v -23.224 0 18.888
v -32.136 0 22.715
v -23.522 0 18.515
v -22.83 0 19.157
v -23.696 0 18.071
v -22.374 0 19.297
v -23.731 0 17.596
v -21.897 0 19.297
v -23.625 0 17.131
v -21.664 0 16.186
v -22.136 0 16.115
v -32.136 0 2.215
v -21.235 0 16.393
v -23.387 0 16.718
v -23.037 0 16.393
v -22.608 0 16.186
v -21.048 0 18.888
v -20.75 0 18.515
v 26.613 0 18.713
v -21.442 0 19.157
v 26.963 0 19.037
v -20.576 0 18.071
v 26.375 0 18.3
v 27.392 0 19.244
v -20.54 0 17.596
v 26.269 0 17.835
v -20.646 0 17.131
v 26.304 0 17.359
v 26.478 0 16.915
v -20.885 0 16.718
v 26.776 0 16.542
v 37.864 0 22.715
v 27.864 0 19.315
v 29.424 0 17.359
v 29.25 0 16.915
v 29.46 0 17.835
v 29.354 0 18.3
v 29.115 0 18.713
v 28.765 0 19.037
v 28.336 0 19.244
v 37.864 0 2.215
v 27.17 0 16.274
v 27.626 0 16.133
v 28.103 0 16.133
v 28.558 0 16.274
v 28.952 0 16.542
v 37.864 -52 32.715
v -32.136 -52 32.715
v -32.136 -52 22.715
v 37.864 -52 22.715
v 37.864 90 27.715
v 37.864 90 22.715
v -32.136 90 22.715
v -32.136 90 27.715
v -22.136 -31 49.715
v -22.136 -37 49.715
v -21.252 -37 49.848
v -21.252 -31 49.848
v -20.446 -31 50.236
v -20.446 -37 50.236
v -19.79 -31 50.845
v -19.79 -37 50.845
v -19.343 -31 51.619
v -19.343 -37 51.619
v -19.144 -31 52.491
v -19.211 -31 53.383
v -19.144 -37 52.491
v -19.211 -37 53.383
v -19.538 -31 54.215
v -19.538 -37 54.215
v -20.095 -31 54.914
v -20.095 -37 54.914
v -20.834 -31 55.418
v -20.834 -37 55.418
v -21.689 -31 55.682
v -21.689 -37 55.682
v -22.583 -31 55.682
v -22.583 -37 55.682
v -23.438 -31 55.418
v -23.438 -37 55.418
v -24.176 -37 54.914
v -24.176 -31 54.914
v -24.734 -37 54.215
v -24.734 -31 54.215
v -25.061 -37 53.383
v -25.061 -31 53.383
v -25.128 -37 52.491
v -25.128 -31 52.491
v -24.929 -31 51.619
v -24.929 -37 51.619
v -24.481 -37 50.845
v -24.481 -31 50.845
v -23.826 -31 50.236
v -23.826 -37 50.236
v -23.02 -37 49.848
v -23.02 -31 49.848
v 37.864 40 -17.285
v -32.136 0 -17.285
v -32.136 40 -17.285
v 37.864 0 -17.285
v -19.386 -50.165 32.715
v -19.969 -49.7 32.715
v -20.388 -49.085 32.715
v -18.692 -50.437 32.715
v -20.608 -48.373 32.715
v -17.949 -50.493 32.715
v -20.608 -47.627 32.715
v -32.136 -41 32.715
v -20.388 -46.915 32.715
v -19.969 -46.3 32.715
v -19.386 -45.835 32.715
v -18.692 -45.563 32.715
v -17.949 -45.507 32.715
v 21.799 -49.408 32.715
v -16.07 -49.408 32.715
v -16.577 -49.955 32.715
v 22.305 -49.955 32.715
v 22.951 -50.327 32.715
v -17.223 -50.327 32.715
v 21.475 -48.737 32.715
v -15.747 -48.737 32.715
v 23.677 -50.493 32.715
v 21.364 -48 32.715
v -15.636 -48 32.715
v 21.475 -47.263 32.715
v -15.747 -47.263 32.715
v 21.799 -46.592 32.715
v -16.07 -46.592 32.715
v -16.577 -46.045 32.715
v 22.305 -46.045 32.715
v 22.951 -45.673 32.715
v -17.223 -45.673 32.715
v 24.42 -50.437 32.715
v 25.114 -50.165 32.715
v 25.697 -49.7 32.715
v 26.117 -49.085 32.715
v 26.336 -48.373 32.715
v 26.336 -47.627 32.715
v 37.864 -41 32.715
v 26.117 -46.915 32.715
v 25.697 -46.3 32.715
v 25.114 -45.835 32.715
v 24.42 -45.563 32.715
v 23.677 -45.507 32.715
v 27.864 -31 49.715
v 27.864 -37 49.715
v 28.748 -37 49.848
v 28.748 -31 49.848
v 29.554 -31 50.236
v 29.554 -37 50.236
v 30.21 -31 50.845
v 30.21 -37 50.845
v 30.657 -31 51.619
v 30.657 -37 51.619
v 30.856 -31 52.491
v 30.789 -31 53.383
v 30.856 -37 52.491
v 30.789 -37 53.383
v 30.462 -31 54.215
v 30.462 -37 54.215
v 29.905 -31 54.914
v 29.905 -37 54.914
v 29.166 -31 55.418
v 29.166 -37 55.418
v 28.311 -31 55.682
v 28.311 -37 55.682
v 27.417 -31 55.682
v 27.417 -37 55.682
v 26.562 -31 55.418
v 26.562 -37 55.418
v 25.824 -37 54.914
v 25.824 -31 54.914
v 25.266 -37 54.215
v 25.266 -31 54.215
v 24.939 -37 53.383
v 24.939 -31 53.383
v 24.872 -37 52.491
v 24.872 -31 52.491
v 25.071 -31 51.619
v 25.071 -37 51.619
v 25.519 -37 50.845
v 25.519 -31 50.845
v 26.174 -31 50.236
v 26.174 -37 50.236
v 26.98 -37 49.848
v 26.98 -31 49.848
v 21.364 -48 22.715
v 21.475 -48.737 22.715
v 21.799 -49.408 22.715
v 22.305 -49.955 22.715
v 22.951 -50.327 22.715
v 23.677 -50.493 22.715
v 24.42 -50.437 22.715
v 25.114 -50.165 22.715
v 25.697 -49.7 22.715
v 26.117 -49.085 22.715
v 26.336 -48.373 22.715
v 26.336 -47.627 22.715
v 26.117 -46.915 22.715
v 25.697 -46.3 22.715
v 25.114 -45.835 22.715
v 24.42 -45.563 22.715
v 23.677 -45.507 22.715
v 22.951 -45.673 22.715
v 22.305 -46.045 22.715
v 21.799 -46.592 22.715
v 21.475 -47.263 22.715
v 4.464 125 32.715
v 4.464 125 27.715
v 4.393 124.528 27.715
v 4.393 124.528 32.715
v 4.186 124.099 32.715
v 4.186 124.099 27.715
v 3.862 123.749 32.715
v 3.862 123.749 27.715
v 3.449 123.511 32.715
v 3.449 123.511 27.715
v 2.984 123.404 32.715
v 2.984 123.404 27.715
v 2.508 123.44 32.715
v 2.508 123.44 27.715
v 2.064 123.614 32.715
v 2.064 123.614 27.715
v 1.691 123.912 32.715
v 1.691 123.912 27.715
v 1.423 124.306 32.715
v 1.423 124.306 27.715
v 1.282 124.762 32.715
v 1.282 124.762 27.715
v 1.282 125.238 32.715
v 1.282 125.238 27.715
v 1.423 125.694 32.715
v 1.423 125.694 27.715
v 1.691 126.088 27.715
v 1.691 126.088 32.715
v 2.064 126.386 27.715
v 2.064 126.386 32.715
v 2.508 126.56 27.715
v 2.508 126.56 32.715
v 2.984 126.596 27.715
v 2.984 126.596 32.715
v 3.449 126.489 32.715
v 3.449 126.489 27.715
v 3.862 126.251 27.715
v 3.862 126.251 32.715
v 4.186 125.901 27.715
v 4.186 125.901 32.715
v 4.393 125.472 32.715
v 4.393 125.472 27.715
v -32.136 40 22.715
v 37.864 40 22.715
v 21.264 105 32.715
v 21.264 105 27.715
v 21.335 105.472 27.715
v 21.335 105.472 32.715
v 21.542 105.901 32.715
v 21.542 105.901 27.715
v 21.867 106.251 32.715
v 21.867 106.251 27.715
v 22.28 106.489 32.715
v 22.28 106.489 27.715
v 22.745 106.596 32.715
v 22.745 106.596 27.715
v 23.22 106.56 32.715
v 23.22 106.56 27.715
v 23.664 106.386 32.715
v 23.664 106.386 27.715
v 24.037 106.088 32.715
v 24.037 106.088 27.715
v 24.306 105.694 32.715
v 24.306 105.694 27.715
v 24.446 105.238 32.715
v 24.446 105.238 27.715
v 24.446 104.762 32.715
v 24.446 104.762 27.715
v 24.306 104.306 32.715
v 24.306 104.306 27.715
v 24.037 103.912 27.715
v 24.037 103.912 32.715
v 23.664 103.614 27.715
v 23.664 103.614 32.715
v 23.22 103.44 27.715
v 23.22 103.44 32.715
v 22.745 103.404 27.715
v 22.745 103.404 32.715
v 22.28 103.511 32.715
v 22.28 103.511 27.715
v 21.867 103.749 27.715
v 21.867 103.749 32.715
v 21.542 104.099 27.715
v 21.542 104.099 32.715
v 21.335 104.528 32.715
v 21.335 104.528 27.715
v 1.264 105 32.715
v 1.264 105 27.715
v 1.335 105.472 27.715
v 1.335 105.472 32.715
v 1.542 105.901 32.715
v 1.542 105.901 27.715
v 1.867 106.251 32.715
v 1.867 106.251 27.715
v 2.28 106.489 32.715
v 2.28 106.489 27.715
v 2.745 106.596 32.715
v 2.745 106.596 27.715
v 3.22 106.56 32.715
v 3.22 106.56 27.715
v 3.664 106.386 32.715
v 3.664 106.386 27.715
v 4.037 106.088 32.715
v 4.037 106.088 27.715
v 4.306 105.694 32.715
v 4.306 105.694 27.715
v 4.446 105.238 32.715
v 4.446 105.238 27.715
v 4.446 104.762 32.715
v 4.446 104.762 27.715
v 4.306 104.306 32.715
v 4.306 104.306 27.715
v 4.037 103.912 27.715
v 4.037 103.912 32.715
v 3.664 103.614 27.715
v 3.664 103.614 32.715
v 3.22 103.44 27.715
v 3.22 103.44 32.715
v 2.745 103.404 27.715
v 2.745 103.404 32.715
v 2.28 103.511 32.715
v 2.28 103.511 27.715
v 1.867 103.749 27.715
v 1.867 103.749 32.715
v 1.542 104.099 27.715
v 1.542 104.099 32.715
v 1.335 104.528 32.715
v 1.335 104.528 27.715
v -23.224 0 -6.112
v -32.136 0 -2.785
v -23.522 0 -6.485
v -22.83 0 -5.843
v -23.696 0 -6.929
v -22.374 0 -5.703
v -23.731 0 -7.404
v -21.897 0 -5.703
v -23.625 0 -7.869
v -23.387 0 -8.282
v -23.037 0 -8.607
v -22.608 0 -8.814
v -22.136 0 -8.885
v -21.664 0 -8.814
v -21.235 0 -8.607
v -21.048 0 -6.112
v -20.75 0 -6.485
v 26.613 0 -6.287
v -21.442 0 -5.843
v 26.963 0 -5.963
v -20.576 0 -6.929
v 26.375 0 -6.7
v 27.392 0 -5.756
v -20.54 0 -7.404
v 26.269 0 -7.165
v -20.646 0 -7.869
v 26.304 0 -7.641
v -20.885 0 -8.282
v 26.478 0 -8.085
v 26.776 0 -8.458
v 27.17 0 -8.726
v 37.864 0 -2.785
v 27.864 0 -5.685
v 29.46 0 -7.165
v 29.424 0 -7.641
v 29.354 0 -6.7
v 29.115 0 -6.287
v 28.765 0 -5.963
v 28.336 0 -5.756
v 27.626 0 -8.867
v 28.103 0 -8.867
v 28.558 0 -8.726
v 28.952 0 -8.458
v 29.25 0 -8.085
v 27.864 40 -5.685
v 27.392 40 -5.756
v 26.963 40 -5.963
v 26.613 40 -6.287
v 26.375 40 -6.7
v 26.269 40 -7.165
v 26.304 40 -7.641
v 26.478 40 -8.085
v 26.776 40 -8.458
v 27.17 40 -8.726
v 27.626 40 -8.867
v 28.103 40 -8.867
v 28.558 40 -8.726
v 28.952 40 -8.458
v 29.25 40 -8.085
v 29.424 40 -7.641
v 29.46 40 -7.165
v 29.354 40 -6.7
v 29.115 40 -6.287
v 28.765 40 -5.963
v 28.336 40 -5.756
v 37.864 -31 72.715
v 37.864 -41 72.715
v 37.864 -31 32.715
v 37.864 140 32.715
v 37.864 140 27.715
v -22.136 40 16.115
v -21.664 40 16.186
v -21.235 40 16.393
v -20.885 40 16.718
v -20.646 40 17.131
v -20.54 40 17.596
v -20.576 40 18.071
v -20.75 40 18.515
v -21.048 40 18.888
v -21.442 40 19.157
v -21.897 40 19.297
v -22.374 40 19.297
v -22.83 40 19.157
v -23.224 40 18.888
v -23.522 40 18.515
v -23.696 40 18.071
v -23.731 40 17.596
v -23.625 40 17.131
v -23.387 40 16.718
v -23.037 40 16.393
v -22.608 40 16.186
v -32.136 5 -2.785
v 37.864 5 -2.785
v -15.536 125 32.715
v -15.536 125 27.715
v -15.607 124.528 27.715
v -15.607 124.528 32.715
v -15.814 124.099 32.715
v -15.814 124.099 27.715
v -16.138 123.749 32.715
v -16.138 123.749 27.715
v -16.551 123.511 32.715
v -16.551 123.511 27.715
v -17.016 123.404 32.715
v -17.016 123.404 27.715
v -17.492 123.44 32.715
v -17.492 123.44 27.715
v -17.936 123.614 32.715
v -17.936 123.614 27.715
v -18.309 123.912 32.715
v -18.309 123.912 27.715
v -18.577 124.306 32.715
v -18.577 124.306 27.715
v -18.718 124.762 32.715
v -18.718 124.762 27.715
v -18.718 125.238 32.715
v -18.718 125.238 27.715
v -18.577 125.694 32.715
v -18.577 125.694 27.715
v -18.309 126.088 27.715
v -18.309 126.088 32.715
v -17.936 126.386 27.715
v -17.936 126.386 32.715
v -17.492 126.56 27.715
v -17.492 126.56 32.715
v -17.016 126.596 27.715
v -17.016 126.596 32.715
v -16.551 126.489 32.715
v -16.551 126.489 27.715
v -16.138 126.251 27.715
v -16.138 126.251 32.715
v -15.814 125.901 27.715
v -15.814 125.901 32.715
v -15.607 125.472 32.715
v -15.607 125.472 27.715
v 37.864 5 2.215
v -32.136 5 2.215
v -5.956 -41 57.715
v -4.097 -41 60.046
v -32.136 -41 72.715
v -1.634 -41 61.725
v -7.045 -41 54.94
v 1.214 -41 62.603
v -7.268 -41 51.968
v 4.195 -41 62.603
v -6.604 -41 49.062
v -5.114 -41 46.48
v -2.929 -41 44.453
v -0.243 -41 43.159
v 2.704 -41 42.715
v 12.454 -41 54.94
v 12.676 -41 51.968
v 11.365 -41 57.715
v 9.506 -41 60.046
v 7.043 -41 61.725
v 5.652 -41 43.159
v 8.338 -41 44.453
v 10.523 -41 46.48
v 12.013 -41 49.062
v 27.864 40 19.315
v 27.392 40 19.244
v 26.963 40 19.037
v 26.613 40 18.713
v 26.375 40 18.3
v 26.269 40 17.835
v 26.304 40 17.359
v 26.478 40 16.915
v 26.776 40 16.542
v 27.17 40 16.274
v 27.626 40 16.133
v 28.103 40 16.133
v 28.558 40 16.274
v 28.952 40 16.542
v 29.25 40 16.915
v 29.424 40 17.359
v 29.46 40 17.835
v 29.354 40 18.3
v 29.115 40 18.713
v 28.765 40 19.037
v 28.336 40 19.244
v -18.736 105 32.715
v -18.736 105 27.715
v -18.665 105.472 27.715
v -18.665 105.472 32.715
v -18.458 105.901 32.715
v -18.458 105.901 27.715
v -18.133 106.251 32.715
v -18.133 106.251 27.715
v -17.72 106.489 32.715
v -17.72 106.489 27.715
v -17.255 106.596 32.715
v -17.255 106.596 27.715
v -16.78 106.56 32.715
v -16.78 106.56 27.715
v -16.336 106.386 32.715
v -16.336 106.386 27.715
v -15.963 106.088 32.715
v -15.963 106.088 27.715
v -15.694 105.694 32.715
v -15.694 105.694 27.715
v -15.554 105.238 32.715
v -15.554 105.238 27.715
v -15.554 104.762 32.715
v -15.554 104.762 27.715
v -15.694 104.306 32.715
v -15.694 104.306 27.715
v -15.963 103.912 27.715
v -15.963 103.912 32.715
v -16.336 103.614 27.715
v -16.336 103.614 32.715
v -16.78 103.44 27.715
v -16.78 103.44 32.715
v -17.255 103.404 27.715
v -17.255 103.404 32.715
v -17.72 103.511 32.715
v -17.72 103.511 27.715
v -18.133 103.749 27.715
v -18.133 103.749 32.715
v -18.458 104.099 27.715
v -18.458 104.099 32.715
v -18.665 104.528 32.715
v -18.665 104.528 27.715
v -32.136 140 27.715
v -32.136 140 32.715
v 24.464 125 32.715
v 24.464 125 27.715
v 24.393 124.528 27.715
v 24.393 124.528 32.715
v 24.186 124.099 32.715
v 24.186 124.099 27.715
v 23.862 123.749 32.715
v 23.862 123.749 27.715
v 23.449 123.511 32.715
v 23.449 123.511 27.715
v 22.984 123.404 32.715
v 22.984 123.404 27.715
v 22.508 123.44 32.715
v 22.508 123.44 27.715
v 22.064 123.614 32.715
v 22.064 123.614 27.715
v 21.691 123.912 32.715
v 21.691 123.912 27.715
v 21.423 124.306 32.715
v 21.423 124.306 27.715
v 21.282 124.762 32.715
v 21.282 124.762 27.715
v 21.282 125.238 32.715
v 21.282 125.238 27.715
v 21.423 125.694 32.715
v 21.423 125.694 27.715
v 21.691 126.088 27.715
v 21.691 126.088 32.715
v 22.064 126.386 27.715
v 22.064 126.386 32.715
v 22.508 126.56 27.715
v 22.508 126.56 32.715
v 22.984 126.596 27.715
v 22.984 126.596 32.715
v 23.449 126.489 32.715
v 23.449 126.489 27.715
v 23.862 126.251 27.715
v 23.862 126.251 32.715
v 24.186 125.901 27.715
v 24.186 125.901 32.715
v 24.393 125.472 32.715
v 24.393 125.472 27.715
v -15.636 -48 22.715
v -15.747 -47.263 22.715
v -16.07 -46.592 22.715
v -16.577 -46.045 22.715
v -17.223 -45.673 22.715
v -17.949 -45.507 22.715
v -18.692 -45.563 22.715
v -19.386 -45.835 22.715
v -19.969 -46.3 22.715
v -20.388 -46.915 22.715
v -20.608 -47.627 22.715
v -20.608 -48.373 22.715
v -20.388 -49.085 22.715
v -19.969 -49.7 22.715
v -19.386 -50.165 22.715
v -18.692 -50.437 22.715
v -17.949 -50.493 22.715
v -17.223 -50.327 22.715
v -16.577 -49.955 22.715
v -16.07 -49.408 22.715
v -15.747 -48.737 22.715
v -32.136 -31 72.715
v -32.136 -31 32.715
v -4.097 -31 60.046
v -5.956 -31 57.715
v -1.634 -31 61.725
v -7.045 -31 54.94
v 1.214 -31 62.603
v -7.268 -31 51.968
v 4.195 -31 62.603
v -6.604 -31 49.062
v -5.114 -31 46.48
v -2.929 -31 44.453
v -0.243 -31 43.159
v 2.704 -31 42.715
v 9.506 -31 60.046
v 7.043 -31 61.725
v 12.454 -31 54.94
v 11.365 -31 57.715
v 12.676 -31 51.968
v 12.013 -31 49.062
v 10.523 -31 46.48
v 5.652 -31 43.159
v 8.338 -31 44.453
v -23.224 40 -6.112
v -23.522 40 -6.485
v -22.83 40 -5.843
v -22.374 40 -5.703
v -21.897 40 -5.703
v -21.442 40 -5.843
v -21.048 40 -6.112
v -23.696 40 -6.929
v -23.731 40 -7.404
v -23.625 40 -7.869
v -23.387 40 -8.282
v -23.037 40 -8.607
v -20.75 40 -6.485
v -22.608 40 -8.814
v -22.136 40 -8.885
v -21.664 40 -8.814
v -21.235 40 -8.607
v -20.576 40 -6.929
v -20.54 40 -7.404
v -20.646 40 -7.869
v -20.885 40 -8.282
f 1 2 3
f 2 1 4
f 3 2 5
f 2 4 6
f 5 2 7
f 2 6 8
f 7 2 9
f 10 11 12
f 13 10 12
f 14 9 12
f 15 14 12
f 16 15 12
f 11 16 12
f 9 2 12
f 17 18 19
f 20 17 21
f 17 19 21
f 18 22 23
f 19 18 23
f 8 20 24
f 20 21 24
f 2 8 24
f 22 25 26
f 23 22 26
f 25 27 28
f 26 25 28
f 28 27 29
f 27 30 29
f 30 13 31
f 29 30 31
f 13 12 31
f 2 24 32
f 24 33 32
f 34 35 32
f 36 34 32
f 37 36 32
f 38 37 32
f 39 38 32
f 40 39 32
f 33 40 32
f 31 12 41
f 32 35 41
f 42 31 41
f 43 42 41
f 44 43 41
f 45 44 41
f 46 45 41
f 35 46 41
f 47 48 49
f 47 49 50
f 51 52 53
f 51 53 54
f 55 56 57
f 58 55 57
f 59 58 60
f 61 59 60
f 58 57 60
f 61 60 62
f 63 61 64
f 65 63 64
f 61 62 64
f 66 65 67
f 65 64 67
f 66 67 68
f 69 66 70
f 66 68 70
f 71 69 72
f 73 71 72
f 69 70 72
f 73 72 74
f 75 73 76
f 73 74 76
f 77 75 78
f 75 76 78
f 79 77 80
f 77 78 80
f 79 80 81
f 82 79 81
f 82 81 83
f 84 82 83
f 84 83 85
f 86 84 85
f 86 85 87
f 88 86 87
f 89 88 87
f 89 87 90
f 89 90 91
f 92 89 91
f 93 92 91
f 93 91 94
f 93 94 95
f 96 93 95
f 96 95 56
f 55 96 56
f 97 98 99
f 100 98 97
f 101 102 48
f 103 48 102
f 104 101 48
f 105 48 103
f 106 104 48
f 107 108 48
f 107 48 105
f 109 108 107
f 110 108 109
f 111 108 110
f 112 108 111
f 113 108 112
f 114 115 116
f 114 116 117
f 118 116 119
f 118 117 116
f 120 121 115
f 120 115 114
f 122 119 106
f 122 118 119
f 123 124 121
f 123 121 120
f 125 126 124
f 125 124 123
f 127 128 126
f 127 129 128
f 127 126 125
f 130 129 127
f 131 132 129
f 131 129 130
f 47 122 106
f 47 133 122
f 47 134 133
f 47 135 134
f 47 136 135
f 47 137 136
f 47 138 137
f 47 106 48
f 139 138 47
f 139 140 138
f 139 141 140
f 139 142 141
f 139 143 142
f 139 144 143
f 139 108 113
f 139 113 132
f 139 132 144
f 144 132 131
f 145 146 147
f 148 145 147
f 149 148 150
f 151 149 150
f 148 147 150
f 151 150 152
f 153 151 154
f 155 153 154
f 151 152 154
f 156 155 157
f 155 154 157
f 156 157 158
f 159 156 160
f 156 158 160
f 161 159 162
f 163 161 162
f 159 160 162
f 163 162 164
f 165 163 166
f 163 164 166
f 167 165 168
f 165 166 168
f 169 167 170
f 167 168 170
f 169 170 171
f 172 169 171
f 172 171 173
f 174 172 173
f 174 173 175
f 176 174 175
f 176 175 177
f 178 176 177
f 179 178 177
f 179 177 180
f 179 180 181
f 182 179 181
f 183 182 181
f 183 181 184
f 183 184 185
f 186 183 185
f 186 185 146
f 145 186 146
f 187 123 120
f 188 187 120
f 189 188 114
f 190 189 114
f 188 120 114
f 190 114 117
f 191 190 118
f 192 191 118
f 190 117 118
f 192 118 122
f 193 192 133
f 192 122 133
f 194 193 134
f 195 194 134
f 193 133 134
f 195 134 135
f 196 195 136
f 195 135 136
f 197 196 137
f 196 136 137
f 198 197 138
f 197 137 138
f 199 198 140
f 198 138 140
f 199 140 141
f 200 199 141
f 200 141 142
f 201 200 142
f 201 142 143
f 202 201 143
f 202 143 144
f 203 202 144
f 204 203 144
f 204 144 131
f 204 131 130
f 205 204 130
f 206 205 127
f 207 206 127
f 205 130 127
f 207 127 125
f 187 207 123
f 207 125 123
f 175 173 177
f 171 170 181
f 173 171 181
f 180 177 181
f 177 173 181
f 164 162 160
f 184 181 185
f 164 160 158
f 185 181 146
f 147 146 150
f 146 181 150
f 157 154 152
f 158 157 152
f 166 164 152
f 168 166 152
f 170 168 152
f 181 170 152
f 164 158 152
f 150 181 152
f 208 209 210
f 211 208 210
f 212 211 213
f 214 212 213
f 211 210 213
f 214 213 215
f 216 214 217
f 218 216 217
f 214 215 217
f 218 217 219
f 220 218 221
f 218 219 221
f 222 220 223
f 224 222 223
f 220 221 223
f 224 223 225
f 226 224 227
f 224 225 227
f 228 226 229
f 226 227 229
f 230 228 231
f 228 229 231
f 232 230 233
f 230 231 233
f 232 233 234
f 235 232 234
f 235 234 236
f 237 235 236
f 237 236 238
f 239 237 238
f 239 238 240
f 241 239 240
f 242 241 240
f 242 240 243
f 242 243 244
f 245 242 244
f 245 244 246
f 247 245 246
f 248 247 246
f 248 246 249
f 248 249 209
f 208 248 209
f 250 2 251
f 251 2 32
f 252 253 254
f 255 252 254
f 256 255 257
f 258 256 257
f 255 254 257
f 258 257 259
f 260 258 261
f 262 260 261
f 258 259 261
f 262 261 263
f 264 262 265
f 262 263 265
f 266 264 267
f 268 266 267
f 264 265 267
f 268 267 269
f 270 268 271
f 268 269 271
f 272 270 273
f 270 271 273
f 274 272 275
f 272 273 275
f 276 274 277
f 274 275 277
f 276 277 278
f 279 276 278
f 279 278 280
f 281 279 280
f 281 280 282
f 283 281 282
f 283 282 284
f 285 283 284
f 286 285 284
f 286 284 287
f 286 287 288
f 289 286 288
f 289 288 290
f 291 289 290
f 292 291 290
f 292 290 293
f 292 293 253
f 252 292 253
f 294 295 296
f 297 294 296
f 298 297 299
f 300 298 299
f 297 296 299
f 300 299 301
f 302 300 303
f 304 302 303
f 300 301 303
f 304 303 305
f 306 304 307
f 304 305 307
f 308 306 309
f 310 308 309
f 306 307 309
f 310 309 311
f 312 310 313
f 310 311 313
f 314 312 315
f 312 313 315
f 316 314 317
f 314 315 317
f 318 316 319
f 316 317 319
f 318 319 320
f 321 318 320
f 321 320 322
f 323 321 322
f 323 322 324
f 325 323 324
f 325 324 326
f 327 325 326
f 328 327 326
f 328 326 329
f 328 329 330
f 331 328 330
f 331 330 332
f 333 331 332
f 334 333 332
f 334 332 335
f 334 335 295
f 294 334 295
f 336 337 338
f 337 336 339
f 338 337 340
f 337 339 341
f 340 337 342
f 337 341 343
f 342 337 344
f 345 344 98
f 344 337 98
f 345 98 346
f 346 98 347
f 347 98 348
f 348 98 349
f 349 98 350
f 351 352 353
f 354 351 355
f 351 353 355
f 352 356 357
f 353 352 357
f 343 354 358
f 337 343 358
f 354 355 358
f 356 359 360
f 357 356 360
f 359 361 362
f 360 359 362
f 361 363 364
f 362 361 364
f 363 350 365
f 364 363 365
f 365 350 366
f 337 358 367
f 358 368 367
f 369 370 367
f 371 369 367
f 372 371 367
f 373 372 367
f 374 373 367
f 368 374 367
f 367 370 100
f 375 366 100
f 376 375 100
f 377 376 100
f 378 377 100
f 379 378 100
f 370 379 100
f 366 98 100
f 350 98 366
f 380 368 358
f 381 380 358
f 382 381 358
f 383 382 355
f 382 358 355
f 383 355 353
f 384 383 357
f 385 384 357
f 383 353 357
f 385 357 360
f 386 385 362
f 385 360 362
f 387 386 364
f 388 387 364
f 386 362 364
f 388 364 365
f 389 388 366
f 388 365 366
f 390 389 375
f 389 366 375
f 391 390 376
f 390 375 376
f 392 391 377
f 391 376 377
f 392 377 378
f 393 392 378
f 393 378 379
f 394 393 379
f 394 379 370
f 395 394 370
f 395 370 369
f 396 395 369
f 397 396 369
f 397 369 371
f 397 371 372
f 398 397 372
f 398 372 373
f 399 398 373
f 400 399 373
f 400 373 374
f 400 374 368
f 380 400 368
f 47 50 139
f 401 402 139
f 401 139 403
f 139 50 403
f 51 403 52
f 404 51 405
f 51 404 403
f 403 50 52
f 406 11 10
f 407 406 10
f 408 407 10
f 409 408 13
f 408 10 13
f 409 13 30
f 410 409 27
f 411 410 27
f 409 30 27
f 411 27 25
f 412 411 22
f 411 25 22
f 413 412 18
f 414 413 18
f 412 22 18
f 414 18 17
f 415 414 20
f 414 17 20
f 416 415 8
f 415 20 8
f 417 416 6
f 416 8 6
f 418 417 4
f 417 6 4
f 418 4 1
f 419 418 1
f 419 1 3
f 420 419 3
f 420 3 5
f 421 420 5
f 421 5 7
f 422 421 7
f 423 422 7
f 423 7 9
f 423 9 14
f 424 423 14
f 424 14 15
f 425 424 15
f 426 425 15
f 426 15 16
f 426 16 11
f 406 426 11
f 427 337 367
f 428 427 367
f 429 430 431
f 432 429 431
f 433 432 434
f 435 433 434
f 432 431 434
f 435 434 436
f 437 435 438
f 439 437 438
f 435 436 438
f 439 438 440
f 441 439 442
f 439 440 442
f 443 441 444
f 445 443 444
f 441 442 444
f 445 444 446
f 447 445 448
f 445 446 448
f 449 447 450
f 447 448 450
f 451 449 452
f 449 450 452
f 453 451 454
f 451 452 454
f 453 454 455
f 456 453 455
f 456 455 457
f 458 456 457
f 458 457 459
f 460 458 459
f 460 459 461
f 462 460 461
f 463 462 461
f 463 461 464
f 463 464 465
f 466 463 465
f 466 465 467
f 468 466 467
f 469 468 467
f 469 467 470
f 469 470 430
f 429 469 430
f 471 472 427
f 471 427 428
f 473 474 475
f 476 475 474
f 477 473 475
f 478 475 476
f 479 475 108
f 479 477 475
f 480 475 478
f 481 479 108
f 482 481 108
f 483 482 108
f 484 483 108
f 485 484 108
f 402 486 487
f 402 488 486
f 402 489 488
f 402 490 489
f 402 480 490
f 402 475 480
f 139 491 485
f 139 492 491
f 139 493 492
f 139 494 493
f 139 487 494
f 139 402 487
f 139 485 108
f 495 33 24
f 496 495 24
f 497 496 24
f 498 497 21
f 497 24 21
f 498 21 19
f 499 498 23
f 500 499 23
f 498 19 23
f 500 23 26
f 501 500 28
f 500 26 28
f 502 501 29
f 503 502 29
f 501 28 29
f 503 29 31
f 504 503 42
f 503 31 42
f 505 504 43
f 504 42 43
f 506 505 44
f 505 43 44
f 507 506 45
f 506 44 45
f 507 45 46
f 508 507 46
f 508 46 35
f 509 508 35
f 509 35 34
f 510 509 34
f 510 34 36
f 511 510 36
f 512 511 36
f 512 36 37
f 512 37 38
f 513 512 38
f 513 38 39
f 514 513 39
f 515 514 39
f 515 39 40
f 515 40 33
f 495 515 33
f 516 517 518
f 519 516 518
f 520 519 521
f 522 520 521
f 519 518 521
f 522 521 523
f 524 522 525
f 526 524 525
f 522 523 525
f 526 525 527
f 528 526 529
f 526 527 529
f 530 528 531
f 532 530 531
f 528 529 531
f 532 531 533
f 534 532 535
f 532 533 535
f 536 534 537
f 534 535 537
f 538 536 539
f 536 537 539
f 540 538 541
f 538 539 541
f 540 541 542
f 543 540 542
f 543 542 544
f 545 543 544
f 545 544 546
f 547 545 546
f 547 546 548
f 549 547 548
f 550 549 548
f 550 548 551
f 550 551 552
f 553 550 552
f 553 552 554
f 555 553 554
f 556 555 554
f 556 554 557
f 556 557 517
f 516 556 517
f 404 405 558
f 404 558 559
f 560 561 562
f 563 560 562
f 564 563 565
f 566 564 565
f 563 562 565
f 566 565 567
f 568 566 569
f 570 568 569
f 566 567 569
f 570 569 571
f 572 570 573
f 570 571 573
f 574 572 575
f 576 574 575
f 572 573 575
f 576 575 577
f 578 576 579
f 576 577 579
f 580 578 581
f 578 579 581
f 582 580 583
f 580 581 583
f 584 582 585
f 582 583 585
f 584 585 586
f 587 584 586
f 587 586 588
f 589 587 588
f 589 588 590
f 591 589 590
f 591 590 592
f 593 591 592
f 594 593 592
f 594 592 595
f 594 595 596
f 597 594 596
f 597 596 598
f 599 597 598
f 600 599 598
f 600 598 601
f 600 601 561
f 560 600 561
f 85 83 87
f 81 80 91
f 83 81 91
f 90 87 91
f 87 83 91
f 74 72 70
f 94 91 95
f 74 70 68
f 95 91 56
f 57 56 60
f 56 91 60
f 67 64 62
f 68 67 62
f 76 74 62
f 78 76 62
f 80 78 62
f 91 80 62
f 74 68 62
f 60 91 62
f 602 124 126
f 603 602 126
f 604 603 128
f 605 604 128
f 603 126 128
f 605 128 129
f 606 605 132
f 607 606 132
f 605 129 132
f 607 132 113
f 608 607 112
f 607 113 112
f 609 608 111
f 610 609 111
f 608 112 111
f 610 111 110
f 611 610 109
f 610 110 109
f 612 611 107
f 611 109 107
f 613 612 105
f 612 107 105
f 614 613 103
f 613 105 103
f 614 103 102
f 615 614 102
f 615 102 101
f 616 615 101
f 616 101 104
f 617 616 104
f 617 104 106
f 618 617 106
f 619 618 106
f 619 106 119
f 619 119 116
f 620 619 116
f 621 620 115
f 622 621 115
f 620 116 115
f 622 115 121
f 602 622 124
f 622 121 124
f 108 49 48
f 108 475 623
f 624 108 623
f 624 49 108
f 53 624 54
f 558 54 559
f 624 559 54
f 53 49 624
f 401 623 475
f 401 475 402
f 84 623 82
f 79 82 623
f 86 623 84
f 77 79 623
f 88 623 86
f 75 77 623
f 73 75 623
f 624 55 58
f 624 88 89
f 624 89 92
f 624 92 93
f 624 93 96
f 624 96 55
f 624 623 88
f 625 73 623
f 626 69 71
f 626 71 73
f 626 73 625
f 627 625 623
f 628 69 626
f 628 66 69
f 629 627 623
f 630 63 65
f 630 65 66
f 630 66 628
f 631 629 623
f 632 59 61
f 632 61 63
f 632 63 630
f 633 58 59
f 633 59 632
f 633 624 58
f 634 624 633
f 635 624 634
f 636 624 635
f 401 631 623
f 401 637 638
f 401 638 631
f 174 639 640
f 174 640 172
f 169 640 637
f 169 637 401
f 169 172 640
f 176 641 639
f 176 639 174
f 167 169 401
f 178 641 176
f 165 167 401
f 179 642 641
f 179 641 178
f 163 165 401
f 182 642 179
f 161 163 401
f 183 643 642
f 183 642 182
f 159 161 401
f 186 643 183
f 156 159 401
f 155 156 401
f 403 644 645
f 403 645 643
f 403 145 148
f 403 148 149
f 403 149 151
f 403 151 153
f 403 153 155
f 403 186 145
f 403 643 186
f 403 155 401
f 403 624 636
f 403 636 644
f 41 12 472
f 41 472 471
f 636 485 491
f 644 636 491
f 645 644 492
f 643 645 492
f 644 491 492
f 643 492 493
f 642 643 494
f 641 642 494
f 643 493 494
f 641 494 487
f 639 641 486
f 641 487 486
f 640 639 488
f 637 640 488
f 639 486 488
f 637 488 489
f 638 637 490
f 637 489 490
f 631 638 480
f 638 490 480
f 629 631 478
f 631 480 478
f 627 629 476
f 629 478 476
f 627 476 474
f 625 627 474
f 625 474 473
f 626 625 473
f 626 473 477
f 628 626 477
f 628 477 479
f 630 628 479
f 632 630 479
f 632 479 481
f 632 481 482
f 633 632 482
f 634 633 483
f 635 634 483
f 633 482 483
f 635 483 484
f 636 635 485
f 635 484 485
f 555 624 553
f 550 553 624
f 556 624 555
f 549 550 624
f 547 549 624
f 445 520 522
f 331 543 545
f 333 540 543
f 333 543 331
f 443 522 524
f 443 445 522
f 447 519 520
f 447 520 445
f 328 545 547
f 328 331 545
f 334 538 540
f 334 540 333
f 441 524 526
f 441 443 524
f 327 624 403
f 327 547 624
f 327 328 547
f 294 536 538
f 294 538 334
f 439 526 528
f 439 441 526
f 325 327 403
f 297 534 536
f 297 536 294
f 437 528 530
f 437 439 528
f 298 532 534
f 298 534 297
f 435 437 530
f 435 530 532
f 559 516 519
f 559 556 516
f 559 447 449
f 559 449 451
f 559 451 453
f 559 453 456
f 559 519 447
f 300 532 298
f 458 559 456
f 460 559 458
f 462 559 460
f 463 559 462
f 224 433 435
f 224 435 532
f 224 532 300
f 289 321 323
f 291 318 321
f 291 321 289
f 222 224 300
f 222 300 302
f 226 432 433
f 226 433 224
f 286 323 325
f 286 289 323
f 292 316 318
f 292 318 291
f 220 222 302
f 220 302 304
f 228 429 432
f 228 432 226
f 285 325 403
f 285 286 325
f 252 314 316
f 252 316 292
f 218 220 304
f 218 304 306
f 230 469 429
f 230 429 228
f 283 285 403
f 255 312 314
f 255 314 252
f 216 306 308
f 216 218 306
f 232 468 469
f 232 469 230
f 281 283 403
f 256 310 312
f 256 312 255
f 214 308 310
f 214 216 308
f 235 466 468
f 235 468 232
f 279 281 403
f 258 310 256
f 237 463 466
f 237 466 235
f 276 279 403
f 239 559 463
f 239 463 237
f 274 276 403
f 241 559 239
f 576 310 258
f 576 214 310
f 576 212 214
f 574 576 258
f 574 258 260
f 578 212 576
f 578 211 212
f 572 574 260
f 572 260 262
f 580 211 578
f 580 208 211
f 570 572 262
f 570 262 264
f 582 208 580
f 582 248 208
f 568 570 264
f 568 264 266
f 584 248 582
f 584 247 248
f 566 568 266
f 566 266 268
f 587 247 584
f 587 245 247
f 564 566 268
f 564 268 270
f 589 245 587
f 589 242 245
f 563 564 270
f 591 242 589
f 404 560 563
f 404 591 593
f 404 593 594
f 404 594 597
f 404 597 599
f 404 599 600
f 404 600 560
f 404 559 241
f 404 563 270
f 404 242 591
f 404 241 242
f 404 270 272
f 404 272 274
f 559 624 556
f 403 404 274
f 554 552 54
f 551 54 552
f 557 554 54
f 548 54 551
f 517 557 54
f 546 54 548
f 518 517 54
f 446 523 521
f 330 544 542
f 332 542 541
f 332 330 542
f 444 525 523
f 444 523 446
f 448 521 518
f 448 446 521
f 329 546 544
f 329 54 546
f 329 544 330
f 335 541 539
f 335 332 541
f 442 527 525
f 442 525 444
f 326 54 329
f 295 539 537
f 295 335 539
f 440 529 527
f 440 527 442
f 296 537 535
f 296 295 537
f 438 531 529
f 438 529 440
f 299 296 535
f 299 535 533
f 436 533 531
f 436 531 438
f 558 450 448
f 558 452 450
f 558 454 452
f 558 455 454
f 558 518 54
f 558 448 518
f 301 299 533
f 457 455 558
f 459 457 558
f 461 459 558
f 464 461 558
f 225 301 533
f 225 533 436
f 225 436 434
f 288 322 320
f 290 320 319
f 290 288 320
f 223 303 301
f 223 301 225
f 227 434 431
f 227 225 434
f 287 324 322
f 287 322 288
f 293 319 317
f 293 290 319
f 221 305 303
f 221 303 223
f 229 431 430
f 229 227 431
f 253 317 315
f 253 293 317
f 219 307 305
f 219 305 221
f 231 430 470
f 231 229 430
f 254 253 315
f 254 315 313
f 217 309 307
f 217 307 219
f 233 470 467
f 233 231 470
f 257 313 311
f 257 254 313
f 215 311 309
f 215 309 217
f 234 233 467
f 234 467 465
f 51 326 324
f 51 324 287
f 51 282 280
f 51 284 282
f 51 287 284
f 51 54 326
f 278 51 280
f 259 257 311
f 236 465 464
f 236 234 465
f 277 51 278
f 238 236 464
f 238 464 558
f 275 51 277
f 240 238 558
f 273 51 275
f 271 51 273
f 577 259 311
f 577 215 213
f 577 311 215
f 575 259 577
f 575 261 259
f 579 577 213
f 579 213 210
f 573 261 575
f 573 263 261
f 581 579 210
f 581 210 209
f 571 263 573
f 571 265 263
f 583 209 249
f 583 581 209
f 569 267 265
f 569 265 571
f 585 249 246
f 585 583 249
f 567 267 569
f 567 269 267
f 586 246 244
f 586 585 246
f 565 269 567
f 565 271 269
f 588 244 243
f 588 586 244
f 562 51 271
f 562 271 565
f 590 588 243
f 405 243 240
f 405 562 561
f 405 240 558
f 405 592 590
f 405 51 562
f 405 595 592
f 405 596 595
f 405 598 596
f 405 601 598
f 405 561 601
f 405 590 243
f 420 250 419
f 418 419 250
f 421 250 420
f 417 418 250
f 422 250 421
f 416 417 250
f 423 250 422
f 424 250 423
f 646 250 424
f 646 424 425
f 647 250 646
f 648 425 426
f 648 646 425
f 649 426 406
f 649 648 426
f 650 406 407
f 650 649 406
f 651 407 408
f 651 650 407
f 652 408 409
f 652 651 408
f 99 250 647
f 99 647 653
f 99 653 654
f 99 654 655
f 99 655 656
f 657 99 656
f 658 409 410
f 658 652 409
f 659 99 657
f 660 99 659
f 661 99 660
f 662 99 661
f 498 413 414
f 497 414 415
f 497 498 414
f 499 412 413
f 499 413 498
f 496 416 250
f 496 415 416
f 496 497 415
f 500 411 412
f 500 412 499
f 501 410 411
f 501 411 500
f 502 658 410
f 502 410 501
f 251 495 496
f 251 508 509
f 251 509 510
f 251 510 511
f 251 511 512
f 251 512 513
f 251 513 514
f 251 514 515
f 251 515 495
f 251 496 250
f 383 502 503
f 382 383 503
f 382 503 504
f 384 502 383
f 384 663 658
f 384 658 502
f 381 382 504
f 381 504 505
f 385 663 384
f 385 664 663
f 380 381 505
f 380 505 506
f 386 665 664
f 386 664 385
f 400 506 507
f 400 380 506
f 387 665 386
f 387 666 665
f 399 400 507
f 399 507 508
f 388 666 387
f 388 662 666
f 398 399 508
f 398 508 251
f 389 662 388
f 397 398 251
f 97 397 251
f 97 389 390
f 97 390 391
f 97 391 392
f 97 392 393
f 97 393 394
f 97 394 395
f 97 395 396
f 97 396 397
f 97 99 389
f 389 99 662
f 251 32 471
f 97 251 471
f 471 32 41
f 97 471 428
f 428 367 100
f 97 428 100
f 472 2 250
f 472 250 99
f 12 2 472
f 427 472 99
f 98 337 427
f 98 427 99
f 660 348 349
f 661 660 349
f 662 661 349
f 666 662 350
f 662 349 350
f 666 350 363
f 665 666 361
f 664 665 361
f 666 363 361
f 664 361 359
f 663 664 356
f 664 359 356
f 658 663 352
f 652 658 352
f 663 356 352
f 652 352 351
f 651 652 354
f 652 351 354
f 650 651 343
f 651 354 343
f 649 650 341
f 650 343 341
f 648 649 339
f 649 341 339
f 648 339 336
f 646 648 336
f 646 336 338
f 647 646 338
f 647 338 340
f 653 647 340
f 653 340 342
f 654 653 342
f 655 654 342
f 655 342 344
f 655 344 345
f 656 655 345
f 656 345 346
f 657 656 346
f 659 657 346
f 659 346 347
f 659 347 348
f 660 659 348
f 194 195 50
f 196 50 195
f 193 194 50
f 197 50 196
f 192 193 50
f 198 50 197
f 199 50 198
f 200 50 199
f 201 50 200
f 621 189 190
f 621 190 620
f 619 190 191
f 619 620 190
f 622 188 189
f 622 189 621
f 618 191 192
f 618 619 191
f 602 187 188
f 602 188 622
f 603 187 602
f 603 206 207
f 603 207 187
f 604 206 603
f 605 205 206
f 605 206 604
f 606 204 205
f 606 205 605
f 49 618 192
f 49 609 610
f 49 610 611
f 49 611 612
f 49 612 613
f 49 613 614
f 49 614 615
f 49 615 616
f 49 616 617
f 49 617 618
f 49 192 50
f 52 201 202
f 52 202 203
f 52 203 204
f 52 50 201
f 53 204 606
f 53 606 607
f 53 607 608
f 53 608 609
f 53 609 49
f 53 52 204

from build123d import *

# Parameters (mm, degrees)
SKETCH_1_W                     = 70
SKETCH_1_H                     = 40
EXTRUDE_1_DEPTH                = 40
SKETCH_2_R                     = 1.6
CUT_EXTRUDE_1_DEPTH            = 60.579081363
EXTRUDE_2_DEPTH                = 52
EXTRUDE_2_DEPTH_BACK           = 236
SKETCH_4_W                     = 70
SKETCH_4_H                     = 10
SKETCH_5_R                     = 2.5
CUT_EXTRUDE_2_DEPTH            = 10
SKETCH_6_R                     = 2.5
CUT_EXTRUDE_3_DEPTH            = 10
SKETCH_7_W                     = 70
SKETCH_7_H                     = 10
EXTRUDE_3_DEPTH                = 50
SKETCH_8_R                     = 12.5
CUT_EXTRUDE_4_DEPTH            = 10
SKETCH_12_W                    = 39
SKETCH_12_H                    = 39
SKETCH_12_W_2                  = 27
SKETCH_12_H_2                  = 27
EXTRUDE_2_2_DEPTH              = 15
SKETCH_14_R                    = 2
CUT_EXTRUDE_5_DEPTH            = 25
SKETCH_15_W                    = 70
SKETCH_15_H                    = 5
CUT_EXTRUDE_6_DEPTH            = 5
SKETCH_16_W                    = 70
SKETCH_16_H                    = 10
EXTRUDE_4_DEPTH                = 40
SKETCH_18_R                    = 3
CUT_EXTRUDE_7_DEPTH            = 313.929990298
SKETCH_19_R                    = 3
EXTRUDE_5_DEPTH                = 4
SKETCH_24_R                    = 10
CUT_EXTRUDE_9_DEPTH            = 10
SKETCH_26_R                    = 1.6
CUT_EXTRUDE_10_DEPTH           = 10
SPLIT_BODIES_1_SURFACE_1_BACK  = 334.12
SPLIT_BODIES_1_SURFACE_1_DEPTH = 668.24
SPLIT_BODIES_1_SURFACE_2_BACK  = 334.12
SPLIT_BODIES_1_SURFACE_2_DEPTH = 668.24


with BuildPart() as part:
    # 草图1 → 凸台-拉伸1 (new body)
    with BuildSketch(Plane(origin=(0, 0, 0), x_dir=(1, 0, 0), z_dir=(0, 1, 0))):
        with Locations((2.864103165, -2.71511892)):
            Rectangle(SKETCH_1_W, SKETCH_1_H)
    extrude(amount=EXTRUDE_1_DEPTH)

    # 草图2 → 切除-拉伸1 (cut, through all)
    with BuildSketch(Plane.XZ):
        with Locations(Location((-22.135896835, 17.71511892, 0), (0, 0, 270))):
            Circle(SKETCH_2_R)
        with Locations(Location((27.864103165, 17.71511892, 0), (0, 0, 90))):
            Circle(SKETCH_2_R)
        with Locations(Location((-22.135896835, -7.28488108, 0), (0, 0, 270))):
            Circle(SKETCH_2_R)
        with Locations(Location((27.864103165, -7.28488108, 0), (0, 0, 90))):
            Circle(SKETCH_2_R)
    extrude(amount=-CUT_EXTRUDE_1_DEPTH, mode=Mode.SUBTRACT)

    # 草图15 → 切除-拉伸6 (cut)
    with BuildSketch(Plane.XZ):
        with Locations((2.864103165, -0.28488108)):
            Rectangle(SKETCH_15_W, SKETCH_15_H)
    extrude(amount=-CUT_EXTRUDE_6_DEPTH, mode=Mode.SUBTRACT)


with BuildPart() as body_2:
    # 草图4 → Extrude 2 (new, two sides: drawn at the far end of the back side and taken through both)
    with BuildSketch(Plane.XZ.offset(-EXTRUDE_2_DEPTH_BACK)):
        with Locations((2.864103165, 27.71511892)):
            Rectangle(SKETCH_4_W, SKETCH_4_H)
    extrude(amount=EXTRUDE_2_DEPTH + EXTRUDE_2_DEPTH_BACK)

    # 草图5 → 切除-拉伸2 (cut)
    with BuildSketch(Plane.XY.offset(32.71511892)):
        with Locations((-18.135896835, -48)):
            Circle(SKETCH_5_R)
        with Locations(Location((23.864103165, -48, 0), (0, 0, 180))):
            Circle(SKETCH_5_R)
    extrude(amount=-CUT_EXTRUDE_2_DEPTH, mode=Mode.SUBTRACT)

    # 草图6 → 切除-拉伸3 (cut)
    with BuildSketch(Plane.XY.offset(32.71511892)):
        with Locations((-18.135896835, 212)):
            Circle(SKETCH_6_R)
        with Locations(Location((23.864103165, 212, 0), (0, 0, 180))):
            Circle(SKETCH_6_R)
    extrude(amount=-CUT_EXTRUDE_3_DEPTH, mode=Mode.SUBTRACT)

    # 草图7 → 凸台-拉伸3 (add)
    with BuildSketch(Plane(origin=(0, 0, 22.71511892), x_dir=(-1, 0, 0), z_dir=(0, 0, -1))):
        with Locations((-2.864103165, 241)):
            Rectangle(SKETCH_7_W, SKETCH_7_H)
    extrude(amount=-EXTRUDE_3_DEPTH)

    # 草图8 → 切除-拉伸4 (cut)
    with BuildSketch(Plane.XZ.offset(-236)):
        with Locations(Location((2.864103165, 52.71511892, 0), (0, 0, 270))):
            Circle(SKETCH_8_R)
    extrude(amount=-CUT_EXTRUDE_4_DEPTH, mode=Mode.SUBTRACT)

    # 草图12 → Extrude 2 2 (add)
    with BuildSketch(Plane(origin=(0, 246, 0), x_dir=(1, 0, 0), z_dir=(0, 1, 0))):
        with Locations((2.864103165, -52.71511892)):
            Rectangle(SKETCH_12_W, SKETCH_12_H)
        with Locations((2.864103165, -52.71511892)):
            Rectangle(SKETCH_12_W_2, SKETCH_12_H_2, mode=Mode.SUBTRACT)
    extrude(amount=EXTRUDE_2_2_DEPTH)

    # 草图14 → 切除-拉伸5 (cut)
    with BuildSketch(Plane(origin=(0, 261, 0), x_dir=(1, 0, 0), z_dir=(0, 1, 0))):
        with Locations(Location((-12.635896835, -37.21511892, 0), (0, 0, 270))):
            Circle(SKETCH_14_R)
        with Locations(Location((18.364103165, -37.21511892, 0), (0, 0, 90))):
            Circle(SKETCH_14_R)
        with Locations(Location((-12.635896835, -68.21511892, 0), (0, 0, 90))):
            Circle(SKETCH_14_R)
        with Locations(Location((18.364103165, -68.21511892, 0), (0, 0, 270))):
            Circle(SKETCH_14_R)
    extrude(amount=-CUT_EXTRUDE_5_DEPTH, mode=Mode.SUBTRACT)

    # 草图16 → 凸台-拉伸4 (add)
    with BuildSketch(Plane.XY.offset(32.71511892)):
        with Locations((2.864103165, -36)):
            Rectangle(SKETCH_16_W, SKETCH_16_H)
    extrude(amount=EXTRUDE_4_DEPTH)

    # 草图18 → 切除-拉伸7 (cut, through all)
    with BuildSketch(Plane.XZ.offset(41)):
        with Locations(Location((-22.135896835, 52.71511892, 0), (0, 0, 270))):
            Circle(SKETCH_18_R)
        with Locations(Location((27.864103165, 52.71511892, 0), (0, 0, 270))):
            Circle(SKETCH_18_R)
    extrude(amount=-CUT_EXTRUDE_7_DEPTH, mode=Mode.SUBTRACT)

    # 草图19 → 凸台-拉伸5 (add)
    with BuildSketch(Plane.XZ.offset(41)):
        with Locations(Location((-22.135896835, 52.71511892, 0), (0, 0, 270))):
            Circle(SKETCH_19_R)
        with Locations(Location((27.864103165, 52.71511892, 0), (0, 0, 270))):
            Circle(SKETCH_19_R)
    extrude(amount=-EXTRUDE_5_DEPTH)

    # 草图24 → 切除-拉伸9 (cut)
    with BuildSketch(Plane.XZ.offset(41)):
        with Locations(Location((2.704454521, 52.71511892, 0), (0, 0, 270))):
            Circle(SKETCH_24_R)
    extrude(amount=-CUT_EXTRUDE_9_DEPTH, mode=Mode.SUBTRACT)

    # 草图26 → 切除-拉伸10 (cut)
    with BuildSketch(Plane(origin=(0, 0, 22.71511892), x_dir=(-1, 0, 0), z_dir=(0, 0, -1))):
        with Locations((17.135896835, 105)):
            Circle(SKETCH_26_R)
        with Locations((-2.864103165, 105)):
            Circle(SKETCH_26_R)
        with Locations((-22.864103165, 105)):
            Circle(SKETCH_26_R)
        with Locations(Location((17.135896835, 125, 0), (0, 0, 180))):
            Circle(SKETCH_26_R)
        with Locations(Location((-2.864103165, 125, 0), (0, 0, 180))):
            Circle(SKETCH_26_R)
        with Locations(Location((-22.864103165, 125, 0), (0, 0, 180))):
            Circle(SKETCH_26_R)
    extrude(amount=-CUT_EXTRUDE_10_DEPTH, mode=Mode.SUBTRACT)


with BuildPart() as body_3:
    # Split Bodies 1: the piece behind the surface
    add(body_2.part)
    # Split Bodies 1 surface: a surface, the sketch's curves swept straight by 668.24 mm
    with BuildLine(Plane.ZY.offset(32.135896835).offset(-SPLIT_BODIES_1_SURFACE_1_BACK), mode=Mode.PRIVATE) as split_bodies_1_surface_1_path:
        Line((22.71511892, 90), (27.71511892, 90))
        Line((27.71511892, 90), (27.71511892, 140))
        Line((27.71511892, 140), (32.71511892, 140))
    split_bodies_1_surface_1 = Shell.extrude(split_bodies_1_surface_1_path.wire(), (-1 * SPLIT_BODIES_1_SURFACE_1_DEPTH, 0 * SPLIT_BODIES_1_SURFACE_1_DEPTH, 0 * SPLIT_BODIES_1_SURFACE_1_DEPTH))
    split(bisect_by=split_bodies_1_surface_1, keep=Keep.BOTTOM)


with BuildPart() as body_2_1:
    add(body_2.part)

    # Split Bodies 1: split by a surface, the side it looks to stays
    # Split Bodies 1 surface: a surface, the sketch's curves swept straight by 668.24 mm
    with BuildLine(Plane.ZY.offset(32.135896835).offset(-SPLIT_BODIES_1_SURFACE_2_BACK), mode=Mode.PRIVATE) as split_bodies_1_surface_2_path:
        Line((22.71511892, 90), (27.71511892, 90))
        Line((27.71511892, 90), (27.71511892, 140))
        Line((27.71511892, 140), (32.71511892, 140))
    split_bodies_1_surface_2 = Shell.extrude(split_bodies_1_surface_2_path.wire(), (-1 * SPLIT_BODIES_1_SURFACE_2_DEPTH, 0 * SPLIT_BODIES_1_SURFACE_2_DEPTH, 0 * SPLIT_BODIES_1_SURFACE_2_DEPTH))
    split(bisect_by=split_bodies_1_surface_2, keep=Keep.TOP)


solid = Compound([part.part, body_3.part])
